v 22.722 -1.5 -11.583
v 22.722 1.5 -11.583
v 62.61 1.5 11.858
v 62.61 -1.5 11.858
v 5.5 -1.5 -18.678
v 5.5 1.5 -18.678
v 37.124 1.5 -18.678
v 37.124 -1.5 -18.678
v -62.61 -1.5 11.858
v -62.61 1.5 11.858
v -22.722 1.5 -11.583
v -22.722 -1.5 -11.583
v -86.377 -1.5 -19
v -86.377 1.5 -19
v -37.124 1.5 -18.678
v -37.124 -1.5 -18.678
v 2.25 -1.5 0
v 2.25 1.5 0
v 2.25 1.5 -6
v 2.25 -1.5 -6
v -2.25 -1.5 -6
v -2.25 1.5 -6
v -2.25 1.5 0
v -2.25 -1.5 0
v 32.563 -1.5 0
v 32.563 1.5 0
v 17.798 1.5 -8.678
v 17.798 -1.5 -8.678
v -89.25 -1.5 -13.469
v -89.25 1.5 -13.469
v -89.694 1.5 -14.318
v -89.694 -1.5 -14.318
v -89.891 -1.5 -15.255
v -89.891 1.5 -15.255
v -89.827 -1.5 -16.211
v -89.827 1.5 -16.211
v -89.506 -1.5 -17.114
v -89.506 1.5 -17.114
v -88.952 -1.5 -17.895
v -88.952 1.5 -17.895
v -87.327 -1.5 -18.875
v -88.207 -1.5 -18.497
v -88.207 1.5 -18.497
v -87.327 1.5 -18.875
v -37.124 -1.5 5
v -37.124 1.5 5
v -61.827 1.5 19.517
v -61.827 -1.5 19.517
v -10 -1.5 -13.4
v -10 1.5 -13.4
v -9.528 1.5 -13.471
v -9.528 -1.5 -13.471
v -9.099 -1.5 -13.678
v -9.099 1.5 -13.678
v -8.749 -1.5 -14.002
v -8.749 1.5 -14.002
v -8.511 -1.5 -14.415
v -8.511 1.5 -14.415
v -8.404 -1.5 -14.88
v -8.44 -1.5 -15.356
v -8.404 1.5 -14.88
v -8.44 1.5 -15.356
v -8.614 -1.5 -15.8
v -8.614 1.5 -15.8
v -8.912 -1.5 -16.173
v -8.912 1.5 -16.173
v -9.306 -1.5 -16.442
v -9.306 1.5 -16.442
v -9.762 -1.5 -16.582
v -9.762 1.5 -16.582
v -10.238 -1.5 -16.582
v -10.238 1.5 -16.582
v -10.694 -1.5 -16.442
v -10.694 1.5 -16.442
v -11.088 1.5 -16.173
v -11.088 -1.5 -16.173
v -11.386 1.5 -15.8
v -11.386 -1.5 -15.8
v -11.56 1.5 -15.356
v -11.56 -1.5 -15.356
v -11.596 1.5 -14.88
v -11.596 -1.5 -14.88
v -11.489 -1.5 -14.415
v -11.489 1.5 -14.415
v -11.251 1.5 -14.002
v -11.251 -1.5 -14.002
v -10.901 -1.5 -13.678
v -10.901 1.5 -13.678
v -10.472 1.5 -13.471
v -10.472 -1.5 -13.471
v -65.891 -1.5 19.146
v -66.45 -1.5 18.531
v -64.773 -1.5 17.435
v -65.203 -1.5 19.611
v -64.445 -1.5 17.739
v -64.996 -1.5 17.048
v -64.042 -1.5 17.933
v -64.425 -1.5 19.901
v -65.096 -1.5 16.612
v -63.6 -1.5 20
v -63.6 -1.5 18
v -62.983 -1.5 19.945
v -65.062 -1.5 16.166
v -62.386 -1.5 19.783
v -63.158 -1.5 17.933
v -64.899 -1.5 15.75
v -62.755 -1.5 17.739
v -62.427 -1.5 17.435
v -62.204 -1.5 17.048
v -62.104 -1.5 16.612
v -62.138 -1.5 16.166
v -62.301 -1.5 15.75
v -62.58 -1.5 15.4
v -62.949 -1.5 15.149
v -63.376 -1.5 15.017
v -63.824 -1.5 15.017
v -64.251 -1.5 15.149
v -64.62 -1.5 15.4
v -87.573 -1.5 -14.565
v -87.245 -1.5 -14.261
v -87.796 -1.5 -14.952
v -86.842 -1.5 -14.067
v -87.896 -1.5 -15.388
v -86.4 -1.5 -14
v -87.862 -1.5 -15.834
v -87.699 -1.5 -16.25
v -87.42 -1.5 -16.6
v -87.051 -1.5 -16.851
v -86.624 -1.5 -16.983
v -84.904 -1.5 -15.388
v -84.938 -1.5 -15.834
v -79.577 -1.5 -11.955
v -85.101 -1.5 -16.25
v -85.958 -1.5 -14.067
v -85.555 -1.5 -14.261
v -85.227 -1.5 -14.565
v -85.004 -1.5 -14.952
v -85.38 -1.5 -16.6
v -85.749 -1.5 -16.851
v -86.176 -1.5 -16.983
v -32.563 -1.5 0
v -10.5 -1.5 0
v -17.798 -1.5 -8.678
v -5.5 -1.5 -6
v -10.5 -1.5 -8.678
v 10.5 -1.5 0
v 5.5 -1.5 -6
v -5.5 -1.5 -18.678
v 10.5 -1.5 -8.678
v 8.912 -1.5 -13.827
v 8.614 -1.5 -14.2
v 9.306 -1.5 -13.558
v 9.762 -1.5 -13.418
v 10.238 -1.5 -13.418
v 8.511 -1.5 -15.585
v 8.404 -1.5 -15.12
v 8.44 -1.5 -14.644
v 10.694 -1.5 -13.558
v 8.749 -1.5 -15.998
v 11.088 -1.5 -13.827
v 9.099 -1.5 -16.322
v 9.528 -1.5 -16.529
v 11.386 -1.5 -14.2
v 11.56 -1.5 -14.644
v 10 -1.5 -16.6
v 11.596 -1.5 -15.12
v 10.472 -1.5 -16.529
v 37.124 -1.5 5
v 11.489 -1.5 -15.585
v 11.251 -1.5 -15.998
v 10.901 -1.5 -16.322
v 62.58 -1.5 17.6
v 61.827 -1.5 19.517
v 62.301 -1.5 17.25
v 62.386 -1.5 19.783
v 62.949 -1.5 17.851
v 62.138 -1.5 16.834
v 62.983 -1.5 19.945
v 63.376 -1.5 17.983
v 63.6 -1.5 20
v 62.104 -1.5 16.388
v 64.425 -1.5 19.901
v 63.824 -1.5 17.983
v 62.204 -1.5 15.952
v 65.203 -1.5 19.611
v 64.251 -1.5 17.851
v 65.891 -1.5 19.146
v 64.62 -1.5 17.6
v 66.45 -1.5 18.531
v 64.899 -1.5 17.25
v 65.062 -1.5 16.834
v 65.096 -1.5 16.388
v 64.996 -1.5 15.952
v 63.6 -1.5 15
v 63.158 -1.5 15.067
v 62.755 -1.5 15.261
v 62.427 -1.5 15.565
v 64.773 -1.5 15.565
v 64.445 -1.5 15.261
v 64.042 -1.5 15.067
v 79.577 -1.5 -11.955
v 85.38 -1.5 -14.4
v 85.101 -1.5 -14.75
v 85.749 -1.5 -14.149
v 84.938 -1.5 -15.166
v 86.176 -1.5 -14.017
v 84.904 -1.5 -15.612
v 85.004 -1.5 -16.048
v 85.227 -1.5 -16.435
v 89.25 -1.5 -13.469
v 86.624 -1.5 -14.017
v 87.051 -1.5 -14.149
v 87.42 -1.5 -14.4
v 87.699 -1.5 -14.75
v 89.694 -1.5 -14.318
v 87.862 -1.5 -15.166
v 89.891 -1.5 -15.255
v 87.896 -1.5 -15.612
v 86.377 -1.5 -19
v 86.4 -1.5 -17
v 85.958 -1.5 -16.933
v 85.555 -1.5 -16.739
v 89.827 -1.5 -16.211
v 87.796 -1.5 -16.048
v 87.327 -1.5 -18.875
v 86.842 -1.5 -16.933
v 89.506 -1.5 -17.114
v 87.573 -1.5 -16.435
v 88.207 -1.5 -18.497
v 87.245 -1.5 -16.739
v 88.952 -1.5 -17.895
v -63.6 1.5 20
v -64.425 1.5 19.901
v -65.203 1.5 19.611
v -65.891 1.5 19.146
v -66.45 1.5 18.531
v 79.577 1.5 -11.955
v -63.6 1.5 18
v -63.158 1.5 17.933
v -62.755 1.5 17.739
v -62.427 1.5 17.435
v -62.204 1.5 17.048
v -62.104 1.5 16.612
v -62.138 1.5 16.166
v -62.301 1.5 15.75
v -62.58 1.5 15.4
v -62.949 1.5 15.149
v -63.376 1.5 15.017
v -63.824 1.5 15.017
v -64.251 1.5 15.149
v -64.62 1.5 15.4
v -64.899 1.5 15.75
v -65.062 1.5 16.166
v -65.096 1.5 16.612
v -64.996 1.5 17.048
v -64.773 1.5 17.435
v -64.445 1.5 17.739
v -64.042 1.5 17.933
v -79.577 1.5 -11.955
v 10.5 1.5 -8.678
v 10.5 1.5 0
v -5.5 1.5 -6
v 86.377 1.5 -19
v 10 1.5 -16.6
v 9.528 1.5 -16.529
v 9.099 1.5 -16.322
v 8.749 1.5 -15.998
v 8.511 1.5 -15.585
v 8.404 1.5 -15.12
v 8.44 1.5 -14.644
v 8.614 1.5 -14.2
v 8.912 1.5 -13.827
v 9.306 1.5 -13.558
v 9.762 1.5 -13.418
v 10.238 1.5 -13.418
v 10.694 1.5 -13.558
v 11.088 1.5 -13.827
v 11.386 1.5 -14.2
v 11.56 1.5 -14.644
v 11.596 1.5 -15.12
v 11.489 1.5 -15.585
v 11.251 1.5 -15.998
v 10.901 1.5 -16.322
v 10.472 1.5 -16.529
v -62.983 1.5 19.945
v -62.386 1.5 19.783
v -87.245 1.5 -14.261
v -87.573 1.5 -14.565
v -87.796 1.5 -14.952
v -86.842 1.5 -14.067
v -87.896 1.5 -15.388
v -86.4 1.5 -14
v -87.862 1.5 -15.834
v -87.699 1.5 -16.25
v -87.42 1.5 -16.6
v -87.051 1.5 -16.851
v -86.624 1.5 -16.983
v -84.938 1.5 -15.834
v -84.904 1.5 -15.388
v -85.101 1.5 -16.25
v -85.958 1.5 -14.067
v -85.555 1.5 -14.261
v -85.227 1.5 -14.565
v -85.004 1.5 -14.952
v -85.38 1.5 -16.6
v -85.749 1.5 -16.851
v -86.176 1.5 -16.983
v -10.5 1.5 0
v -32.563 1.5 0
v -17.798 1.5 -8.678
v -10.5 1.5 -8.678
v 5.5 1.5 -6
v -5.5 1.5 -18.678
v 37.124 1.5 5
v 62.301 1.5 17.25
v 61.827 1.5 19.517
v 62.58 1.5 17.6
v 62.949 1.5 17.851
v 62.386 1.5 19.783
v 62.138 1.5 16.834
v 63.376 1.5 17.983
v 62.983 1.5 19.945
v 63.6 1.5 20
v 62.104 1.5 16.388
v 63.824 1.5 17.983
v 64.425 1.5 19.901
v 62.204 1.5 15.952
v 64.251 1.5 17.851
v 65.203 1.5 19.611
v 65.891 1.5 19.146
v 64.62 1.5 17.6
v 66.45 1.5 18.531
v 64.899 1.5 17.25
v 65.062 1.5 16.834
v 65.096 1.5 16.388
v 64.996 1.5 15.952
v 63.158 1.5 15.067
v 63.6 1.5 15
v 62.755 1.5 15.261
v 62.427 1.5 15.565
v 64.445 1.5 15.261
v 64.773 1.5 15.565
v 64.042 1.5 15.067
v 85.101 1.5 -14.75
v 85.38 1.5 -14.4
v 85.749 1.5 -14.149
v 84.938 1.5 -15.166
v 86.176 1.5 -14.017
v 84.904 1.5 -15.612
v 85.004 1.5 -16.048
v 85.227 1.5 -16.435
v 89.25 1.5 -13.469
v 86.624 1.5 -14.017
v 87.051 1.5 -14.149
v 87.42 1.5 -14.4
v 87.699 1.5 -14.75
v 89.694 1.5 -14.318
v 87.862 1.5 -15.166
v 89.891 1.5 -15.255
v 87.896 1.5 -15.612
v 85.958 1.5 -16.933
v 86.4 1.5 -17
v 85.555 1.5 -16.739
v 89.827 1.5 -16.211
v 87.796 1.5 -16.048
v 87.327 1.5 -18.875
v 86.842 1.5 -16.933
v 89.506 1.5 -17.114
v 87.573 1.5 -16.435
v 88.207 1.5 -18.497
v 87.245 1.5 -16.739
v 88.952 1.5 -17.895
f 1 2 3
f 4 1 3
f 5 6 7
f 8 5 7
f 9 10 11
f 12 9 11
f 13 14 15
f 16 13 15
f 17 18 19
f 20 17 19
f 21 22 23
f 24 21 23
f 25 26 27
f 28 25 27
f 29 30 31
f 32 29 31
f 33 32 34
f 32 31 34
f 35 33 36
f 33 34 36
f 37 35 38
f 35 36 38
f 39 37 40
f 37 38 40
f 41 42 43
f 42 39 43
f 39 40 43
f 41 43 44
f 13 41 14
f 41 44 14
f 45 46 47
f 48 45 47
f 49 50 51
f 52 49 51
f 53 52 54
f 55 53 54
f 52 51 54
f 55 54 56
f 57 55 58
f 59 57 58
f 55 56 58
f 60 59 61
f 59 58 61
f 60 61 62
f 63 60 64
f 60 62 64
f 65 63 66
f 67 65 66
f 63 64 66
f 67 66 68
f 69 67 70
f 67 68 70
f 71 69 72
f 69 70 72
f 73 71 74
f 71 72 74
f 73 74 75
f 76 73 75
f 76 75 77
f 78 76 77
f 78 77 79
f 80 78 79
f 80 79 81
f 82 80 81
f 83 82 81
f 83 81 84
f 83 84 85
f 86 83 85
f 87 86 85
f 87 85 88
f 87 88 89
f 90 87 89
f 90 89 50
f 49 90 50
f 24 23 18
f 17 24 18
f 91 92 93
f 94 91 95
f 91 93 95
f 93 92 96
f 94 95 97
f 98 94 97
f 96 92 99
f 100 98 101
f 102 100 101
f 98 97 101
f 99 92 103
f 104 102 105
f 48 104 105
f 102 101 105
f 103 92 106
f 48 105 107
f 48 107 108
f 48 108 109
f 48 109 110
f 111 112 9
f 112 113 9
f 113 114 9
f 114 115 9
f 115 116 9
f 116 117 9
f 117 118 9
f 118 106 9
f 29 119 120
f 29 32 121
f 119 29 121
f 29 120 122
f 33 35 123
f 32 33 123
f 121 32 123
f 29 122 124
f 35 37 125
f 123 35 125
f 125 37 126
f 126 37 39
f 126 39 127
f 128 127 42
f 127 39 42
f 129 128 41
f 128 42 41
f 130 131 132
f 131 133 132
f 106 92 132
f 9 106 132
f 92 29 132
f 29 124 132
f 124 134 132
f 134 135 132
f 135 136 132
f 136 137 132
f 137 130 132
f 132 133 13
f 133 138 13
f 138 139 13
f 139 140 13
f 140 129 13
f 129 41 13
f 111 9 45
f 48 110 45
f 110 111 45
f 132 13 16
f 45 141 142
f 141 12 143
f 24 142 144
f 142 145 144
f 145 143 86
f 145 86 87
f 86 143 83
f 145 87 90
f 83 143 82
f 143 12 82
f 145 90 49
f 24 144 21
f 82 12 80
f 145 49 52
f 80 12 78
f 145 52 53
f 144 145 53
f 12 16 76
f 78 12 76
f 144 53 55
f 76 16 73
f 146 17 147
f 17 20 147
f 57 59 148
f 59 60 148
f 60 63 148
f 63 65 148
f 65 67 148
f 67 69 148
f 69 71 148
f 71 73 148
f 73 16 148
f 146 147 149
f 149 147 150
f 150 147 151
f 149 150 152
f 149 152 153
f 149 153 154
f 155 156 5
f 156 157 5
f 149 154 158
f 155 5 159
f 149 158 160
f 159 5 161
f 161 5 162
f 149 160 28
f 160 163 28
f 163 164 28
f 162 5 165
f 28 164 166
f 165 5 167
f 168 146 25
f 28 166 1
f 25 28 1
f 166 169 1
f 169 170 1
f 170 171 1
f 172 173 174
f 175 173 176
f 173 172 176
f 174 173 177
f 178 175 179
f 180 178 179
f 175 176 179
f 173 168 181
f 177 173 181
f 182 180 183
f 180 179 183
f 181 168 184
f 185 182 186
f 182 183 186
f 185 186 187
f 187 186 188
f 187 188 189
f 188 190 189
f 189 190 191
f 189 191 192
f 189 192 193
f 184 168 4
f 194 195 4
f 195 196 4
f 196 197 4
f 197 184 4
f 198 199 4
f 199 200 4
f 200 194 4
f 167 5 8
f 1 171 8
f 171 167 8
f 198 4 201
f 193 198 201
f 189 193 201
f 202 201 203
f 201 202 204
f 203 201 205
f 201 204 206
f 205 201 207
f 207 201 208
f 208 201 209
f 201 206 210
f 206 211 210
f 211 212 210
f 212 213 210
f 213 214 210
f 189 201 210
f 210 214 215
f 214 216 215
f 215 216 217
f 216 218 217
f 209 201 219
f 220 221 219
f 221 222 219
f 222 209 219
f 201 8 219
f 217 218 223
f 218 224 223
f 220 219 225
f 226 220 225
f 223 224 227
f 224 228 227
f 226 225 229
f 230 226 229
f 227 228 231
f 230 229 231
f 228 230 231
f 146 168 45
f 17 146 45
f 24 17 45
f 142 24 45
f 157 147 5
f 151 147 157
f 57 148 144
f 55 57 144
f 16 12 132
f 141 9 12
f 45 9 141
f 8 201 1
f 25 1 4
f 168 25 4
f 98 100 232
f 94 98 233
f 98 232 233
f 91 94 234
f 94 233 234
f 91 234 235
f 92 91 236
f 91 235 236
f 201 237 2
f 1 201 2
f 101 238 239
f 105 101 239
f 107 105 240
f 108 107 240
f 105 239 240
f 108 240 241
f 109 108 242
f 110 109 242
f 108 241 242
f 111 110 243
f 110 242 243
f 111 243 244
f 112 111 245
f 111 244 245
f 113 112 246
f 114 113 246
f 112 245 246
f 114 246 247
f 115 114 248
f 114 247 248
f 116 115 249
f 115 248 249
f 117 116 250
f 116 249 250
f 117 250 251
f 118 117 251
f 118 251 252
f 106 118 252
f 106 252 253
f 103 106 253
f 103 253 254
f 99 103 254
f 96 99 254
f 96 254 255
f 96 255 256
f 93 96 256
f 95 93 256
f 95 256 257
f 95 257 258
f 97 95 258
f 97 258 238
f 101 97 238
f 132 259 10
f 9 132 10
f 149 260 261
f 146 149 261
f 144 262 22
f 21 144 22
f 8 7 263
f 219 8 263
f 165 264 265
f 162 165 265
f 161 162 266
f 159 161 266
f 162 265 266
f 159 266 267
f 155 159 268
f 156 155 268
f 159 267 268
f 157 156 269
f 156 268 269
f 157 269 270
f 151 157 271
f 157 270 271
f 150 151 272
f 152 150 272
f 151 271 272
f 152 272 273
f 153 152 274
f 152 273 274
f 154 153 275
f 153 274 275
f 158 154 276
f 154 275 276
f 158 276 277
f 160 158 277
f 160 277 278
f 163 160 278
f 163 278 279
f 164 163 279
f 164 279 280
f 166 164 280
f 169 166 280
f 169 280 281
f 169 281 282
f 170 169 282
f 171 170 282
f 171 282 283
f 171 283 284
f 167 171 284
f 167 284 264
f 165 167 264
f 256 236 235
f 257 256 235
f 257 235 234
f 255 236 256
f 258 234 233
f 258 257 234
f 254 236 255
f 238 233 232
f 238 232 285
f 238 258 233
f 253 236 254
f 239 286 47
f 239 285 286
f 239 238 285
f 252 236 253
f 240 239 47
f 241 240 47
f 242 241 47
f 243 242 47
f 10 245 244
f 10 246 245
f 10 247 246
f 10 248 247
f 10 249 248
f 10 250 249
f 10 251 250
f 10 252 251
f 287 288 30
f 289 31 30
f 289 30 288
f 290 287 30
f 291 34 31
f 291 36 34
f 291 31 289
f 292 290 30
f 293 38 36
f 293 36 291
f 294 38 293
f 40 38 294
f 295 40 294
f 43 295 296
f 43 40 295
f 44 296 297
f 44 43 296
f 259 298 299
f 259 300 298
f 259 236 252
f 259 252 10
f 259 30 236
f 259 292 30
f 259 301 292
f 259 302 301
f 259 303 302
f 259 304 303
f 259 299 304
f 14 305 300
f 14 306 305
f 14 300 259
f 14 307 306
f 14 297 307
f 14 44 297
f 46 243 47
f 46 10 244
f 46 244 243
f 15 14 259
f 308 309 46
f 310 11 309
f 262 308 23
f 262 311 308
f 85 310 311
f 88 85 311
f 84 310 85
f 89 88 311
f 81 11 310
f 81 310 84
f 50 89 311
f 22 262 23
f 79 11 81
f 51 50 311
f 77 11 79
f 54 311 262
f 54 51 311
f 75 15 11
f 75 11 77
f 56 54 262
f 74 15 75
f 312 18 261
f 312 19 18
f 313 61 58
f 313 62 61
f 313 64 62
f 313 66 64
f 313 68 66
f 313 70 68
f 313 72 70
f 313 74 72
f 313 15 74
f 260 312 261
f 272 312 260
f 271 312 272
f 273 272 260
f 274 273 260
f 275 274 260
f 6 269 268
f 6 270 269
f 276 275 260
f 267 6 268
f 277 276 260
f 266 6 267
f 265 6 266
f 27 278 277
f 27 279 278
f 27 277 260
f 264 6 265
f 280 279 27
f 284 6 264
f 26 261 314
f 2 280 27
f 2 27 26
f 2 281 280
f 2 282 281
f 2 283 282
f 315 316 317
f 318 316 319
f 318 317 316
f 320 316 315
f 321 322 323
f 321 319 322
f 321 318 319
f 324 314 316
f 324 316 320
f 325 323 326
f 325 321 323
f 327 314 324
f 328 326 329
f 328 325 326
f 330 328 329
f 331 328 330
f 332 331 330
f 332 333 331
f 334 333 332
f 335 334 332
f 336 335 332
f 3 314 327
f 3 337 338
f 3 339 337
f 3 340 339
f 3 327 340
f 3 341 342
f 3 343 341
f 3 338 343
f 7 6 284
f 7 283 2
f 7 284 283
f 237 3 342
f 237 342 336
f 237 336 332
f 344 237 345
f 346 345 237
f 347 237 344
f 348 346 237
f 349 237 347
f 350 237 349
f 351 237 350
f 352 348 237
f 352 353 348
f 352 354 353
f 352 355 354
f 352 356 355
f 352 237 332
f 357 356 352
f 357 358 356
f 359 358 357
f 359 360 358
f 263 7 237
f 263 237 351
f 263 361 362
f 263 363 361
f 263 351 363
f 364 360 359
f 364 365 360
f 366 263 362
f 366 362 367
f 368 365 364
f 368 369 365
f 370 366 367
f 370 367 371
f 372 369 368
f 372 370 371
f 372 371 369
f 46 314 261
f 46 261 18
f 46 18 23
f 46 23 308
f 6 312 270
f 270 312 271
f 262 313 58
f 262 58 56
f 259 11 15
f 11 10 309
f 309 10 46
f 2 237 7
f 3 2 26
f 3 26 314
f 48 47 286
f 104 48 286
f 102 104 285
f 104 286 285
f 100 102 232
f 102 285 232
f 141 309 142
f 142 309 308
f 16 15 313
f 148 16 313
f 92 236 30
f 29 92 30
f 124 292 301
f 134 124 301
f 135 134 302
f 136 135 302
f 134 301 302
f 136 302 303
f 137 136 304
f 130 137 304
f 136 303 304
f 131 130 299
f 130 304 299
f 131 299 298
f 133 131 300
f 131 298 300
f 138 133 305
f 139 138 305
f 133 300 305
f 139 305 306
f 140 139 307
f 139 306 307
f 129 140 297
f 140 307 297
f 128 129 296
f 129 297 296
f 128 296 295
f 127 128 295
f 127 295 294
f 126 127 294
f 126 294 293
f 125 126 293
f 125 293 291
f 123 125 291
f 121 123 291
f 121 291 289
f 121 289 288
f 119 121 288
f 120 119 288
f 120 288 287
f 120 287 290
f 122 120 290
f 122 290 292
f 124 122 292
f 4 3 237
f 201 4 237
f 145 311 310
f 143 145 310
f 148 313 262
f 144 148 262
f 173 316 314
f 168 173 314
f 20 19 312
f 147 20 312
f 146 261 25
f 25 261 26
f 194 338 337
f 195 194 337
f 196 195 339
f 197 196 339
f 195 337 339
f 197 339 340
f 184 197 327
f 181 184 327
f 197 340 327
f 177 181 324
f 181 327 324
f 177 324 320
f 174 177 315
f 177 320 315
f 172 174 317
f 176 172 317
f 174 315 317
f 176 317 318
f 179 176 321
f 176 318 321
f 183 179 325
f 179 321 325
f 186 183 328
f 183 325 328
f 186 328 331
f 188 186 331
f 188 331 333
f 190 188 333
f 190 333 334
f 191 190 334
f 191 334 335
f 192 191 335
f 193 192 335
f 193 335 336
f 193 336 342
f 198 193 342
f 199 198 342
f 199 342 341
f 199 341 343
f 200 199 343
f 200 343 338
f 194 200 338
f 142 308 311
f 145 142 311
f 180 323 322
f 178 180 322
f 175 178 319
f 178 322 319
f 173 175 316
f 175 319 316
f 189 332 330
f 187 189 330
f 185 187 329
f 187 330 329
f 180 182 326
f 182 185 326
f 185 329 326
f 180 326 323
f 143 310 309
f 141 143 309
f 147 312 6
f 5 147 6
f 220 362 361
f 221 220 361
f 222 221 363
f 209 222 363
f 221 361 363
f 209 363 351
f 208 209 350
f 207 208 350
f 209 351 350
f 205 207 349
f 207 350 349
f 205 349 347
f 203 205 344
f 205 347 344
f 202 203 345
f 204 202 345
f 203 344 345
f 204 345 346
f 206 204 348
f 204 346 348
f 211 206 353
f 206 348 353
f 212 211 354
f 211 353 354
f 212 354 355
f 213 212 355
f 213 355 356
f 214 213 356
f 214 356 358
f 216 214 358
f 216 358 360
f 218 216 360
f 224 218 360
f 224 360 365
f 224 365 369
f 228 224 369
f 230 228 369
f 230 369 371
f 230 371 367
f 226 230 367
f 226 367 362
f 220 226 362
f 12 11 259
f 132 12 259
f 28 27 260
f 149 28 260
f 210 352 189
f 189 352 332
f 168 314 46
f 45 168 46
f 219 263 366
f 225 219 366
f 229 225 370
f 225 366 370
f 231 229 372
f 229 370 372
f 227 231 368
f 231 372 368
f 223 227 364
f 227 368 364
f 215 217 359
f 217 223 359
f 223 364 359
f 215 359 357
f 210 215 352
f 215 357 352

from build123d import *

# Parameters (mm, degrees)
SKETCH_1_W          = 182
SKETCH_1_H          = 40
EXTRUDE_1_DEPTH     = 1.5
SKETCH_2_R          = 1.5
CUT_EXTRUDE_1_DEPTH = 94.220169491
SKETCH_3_R          = 1.6
CUT_EXTRUDE_2_DEPTH = 94.220169491
CUT_EXTRUDE_3_DEPTH = 94.220169491
CUT_EXTRUDE_4_DEPTH = 93.146676554


with BuildPart() as part:
    # 草图1 → 凸台-拉伸1 (new, symmetric)
    with BuildSketch(Plane(origin=(0, 0, 0), x_dir=(1, 0, 0), z_dir=(0, 1, 0))):
        Rectangle(SKETCH_1_W, SKETCH_1_H)
    extrude(amount=EXTRUDE_1_DEPTH, both=True)

    # 草图2 → 切除-拉伸1 (cut, through all)
    with BuildSketch(Plane(origin=(0, 1.5, 0), x_dir=(1, 0, 0), z_dir=(0, 1, 0))):
        with Locations(Location((-86.4, 15.5, 0), (0, 0, 270))):
            Circle(SKETCH_2_R)
        with Locations(Location((-63.6, -16.5, 0), (0, 0, 270))):
            Circle(SKETCH_2_R)
        with Locations(Location((63.6, -16.5, 0), (0, 0, 90))):
            Circle(SKETCH_2_R)
        with Locations(Location((86.4, 15.5, 0), (0, 0, 90))):
            Circle(SKETCH_2_R)
    extrude(amount=-CUT_EXTRUDE_1_DEPTH, mode=Mode.SUBTRACT)

    # 草图3 → 切除-拉伸2 (cut, through all)
    with BuildSketch(Plane(origin=(0, 1.5, 0), x_dir=(1, 0, 0), z_dir=(0, 1, 0))):
        with Locations(Location((-10, 15, 0), (0, 0, 270))):
            Circle(SKETCH_3_R)
        with Locations(Location((10, 15, 0), (0, 0, 90))):
            Circle(SKETCH_3_R)
        Polygon((5.5, 20), (-5.5, 20), (-5.5, 6), (-2.25, 6), (-2.25, 0), (2.25, 0), (2.25, 6), (5.5, 6), align=None)
    extrude(amount=-CUT_EXTRUDE_2_DEPTH, mode=Mode.SUBTRACT)

    # 草图4 → 切除-拉伸3 (cut, through all)
    with BuildSketch(Plane(origin=(0, 1.5, 0), x_dir=(1, 0, 0), z_dir=(0, 1, 0))):
        Polygon((-79.576847618, 11.955270909), (-62.609658275, -11.858328169), (-22.72187982, 11.583183423), align=None)
        with BuildLine():
            ThreePointArc((-89.250472649, 13.469038238), (-89.505875328, 17.113548403), (-86.377094731, 18.999925049))
            Line((-86.377094731, 18.999925049), (-37.123877911, 18.677587243))
            Line((-37.123877911, 18.677587243), (-5.5, 18.677587243))
            Line((-5.5, 18.677587243), (-5.5, 20))
            Line((-5.5, 20), (-91, 20))
            Line((-91, 20), (-91, -20))
            Line((-91, -20), (-63.6, -20))
            ThreePointArc((-63.6, -20), (-65.203376723, -19.611138551), (-66.450472649, -18.530961762))
            Line((-66.450472649, -18.530961762), (-89.250472649, 13.469038238))
        make_face()
        with BuildLine():
            Line((-37.123877911, -5), (-61.826659834, -19.517493108))
            ThreePointArc((-61.826659834, -19.517493108), (-62.68109464, -19.877219705), (-63.6, -20))
            Line((-63.6, -20), (63.600000006, -20))
            ThreePointArc((63.600000006, -20), (62.681094642, -19.877219706), (61.826659834, -19.517493108))
            Line((61.826659834, -19.517493108), (37.123877911, -5))
            Line((37.123877911, -5), (-37.123877911, -5))
        make_face()
        with BuildLine():
            Line((5.5, 20), (5.5, 18.677587243))
            Line((5.5, 18.677587243), (37.123877911, 18.677587243))
            Line((37.123877911, 18.677587243), (86.377094731, 18.999925049))
            ThreePointArc((86.377094731, 18.999925049), (89.505875328, 17.113548403), (89.250472649, 13.469038238))
            Line((89.250472649, 13.469038238), (66.450472649, -18.530961762))
            ThreePointArc((66.450472649, -18.530961762), (65.203376726, -19.61113855), (63.600000006, -20))
            Line((63.600000006, -20), (91, -20))
            Line((91, -20), (91, 20))
            Line((91, 20), (5.5, 20))
        make_face()
        Polygon((79.576847618, 11.955270909), (22.72187982, 11.583183423), (62.609658275, -11.858328169), align=None)
    extrude(amount=-CUT_EXTRUDE_3_DEPTH, mode=Mode.SUBTRACT)

    # 草图5 → 切除-拉伸4 (cut, through all)
    with BuildSketch(Plane(origin=(0, 1.5, 0), x_dir=(1, 0, 0), z_dir=(0, 1, 0))):
        Polygon((-17.797622354, 8.677587243), (-32.563294615, 0), (-10.5, 0), (-10.5, 8.677587243), align=None)
        Polygon((17.797622354, 8.677587243), (10.5, 8.677587243), (10.5, 0), (32.563294615, 0), align=None)
    extrude(amount=-CUT_EXTRUDE_4_DEPTH, mode=Mode.SUBTRACT)


solid = part.part
